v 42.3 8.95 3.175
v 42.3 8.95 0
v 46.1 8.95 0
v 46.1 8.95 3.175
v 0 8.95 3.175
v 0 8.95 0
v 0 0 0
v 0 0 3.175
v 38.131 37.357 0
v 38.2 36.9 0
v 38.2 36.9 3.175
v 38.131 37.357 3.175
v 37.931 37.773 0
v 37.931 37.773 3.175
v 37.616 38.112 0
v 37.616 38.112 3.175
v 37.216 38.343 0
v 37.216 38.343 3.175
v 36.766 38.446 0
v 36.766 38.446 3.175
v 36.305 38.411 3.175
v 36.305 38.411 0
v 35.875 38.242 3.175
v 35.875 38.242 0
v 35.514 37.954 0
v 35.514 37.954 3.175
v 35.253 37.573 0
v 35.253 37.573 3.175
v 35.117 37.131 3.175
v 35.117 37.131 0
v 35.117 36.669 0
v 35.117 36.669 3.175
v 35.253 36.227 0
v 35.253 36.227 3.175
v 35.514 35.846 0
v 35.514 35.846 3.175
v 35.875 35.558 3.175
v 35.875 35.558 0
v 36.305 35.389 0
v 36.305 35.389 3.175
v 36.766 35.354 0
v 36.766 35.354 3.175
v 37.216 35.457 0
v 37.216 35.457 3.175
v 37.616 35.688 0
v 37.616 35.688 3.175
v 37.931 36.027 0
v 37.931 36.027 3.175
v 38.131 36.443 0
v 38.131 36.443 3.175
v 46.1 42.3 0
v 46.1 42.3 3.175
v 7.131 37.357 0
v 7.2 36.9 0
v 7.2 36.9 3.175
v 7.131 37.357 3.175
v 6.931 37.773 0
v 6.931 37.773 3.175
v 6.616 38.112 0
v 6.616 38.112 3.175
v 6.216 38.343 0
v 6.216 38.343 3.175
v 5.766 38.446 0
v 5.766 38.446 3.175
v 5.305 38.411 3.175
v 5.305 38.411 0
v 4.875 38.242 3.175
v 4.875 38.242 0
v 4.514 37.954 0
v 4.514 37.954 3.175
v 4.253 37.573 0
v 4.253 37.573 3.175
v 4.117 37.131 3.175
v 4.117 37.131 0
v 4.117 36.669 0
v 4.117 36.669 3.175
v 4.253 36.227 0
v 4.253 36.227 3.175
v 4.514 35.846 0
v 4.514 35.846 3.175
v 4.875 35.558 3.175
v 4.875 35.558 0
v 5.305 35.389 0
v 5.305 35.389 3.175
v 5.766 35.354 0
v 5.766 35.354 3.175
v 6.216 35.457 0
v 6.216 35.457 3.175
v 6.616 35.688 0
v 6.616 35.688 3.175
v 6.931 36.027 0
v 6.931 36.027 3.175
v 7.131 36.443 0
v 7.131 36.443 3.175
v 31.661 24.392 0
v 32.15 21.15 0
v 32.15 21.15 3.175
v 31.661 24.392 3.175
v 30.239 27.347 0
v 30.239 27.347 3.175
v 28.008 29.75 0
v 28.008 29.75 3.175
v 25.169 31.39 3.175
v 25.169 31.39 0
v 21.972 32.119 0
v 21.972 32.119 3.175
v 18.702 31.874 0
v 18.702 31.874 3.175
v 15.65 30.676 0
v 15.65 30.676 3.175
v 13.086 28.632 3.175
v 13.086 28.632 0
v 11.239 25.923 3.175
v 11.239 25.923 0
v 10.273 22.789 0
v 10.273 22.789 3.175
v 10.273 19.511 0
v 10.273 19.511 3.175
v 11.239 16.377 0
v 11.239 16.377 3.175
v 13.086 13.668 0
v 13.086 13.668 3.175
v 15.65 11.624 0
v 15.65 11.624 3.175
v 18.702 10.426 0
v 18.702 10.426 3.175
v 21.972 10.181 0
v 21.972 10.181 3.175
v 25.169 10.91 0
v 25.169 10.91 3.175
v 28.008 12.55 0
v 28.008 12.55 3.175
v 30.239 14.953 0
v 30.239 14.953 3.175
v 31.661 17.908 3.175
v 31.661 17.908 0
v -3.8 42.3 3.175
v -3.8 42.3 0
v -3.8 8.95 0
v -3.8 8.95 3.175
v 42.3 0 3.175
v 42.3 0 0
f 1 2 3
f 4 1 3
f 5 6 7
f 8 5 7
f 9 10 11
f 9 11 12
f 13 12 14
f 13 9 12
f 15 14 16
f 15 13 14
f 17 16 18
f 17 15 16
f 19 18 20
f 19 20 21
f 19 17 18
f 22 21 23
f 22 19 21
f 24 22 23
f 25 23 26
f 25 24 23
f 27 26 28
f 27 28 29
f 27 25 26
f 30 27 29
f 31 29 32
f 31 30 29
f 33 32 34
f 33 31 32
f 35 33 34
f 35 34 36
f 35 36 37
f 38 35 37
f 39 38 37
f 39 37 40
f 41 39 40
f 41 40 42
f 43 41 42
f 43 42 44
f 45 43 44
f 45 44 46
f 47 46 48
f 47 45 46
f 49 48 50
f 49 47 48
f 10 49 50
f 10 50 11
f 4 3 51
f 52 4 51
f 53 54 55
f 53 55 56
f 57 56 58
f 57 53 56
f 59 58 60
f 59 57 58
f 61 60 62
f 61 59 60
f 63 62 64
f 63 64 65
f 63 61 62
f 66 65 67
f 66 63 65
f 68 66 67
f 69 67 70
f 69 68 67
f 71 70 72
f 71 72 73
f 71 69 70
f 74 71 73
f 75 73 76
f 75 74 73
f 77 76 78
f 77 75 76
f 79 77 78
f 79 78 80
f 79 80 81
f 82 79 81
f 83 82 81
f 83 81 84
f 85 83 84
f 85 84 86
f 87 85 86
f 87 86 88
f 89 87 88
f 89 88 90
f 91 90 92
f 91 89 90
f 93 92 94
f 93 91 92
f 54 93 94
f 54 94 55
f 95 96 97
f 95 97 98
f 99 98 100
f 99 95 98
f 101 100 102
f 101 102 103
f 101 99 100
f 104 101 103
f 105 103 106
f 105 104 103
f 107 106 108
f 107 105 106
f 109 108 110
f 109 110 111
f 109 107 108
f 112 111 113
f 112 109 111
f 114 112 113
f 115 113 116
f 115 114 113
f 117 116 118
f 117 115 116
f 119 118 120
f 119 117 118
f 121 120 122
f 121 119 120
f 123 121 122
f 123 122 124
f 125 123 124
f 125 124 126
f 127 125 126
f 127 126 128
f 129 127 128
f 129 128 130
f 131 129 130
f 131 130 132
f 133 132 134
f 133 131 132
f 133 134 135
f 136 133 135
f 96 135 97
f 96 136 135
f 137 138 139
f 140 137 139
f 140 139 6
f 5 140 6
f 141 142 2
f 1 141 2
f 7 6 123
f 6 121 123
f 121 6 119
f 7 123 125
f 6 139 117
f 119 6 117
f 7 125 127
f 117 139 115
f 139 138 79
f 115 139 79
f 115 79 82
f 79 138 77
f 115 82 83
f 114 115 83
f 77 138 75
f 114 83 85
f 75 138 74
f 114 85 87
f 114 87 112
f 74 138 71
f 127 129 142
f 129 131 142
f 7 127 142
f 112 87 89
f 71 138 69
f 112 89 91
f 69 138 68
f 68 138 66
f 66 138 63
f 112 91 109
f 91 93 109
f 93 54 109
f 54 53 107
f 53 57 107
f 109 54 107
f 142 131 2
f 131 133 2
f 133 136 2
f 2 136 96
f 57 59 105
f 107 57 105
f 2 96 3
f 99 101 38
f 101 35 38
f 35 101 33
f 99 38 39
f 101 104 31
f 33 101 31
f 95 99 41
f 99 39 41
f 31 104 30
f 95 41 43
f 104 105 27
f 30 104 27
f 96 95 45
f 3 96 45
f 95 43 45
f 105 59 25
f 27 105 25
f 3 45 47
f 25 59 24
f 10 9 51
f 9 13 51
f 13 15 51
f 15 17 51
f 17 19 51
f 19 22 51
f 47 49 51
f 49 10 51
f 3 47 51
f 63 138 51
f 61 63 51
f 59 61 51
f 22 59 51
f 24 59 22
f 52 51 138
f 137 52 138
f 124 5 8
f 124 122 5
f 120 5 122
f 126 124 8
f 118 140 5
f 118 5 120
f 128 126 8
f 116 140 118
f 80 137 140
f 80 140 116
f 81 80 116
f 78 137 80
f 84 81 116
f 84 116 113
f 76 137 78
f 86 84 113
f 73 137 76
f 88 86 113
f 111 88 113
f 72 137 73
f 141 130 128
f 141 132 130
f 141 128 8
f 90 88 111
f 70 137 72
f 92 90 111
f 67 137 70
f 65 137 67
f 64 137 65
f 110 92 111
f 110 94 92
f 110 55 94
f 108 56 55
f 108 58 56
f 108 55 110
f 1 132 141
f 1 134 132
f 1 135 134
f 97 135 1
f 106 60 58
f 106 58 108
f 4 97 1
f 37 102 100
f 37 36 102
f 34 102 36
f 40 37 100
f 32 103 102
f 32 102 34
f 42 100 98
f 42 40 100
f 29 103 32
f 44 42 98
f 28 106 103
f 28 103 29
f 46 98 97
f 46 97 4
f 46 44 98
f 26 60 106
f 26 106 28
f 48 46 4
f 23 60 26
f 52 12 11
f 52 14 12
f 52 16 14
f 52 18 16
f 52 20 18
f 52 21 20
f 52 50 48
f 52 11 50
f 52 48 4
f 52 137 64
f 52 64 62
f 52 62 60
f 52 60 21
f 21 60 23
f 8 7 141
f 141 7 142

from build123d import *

# Parameters (mm, degrees)
SKETCH1_R           = 11
SKETCH1_R_2         = 1.55
BOSS_EXTRUDE1_DEPTH = 3.175


with BuildPart() as part:
    # Sketch1 → Boss-Extrude1 (new body)
    with BuildSketch(Plane.XY):
        Polygon((0, 0), (42.3, 0), (42.3, 8.950102459), (46.1, 8.950102459), (46.1, 42.3), (42.3, 42.3), (0, 42.3), (-3.8, 42.3), (-3.8, 8.950102459), (0, 8.950102459), align=None)
        with Locations((21.15, 21.15)):
            Circle(SKETCH1_R, mode=Mode.SUBTRACT)
        with Locations((36.65, 36.9)):
            Circle(SKETCH1_R_2, mode=Mode.SUBTRACT)
        with Locations((5.65, 36.9)):
            Circle(SKETCH1_R_2, mode=Mode.SUBTRACT)
    extrude(amount=BOSS_EXTRUDE1_DEPTH)


solid = part.part
